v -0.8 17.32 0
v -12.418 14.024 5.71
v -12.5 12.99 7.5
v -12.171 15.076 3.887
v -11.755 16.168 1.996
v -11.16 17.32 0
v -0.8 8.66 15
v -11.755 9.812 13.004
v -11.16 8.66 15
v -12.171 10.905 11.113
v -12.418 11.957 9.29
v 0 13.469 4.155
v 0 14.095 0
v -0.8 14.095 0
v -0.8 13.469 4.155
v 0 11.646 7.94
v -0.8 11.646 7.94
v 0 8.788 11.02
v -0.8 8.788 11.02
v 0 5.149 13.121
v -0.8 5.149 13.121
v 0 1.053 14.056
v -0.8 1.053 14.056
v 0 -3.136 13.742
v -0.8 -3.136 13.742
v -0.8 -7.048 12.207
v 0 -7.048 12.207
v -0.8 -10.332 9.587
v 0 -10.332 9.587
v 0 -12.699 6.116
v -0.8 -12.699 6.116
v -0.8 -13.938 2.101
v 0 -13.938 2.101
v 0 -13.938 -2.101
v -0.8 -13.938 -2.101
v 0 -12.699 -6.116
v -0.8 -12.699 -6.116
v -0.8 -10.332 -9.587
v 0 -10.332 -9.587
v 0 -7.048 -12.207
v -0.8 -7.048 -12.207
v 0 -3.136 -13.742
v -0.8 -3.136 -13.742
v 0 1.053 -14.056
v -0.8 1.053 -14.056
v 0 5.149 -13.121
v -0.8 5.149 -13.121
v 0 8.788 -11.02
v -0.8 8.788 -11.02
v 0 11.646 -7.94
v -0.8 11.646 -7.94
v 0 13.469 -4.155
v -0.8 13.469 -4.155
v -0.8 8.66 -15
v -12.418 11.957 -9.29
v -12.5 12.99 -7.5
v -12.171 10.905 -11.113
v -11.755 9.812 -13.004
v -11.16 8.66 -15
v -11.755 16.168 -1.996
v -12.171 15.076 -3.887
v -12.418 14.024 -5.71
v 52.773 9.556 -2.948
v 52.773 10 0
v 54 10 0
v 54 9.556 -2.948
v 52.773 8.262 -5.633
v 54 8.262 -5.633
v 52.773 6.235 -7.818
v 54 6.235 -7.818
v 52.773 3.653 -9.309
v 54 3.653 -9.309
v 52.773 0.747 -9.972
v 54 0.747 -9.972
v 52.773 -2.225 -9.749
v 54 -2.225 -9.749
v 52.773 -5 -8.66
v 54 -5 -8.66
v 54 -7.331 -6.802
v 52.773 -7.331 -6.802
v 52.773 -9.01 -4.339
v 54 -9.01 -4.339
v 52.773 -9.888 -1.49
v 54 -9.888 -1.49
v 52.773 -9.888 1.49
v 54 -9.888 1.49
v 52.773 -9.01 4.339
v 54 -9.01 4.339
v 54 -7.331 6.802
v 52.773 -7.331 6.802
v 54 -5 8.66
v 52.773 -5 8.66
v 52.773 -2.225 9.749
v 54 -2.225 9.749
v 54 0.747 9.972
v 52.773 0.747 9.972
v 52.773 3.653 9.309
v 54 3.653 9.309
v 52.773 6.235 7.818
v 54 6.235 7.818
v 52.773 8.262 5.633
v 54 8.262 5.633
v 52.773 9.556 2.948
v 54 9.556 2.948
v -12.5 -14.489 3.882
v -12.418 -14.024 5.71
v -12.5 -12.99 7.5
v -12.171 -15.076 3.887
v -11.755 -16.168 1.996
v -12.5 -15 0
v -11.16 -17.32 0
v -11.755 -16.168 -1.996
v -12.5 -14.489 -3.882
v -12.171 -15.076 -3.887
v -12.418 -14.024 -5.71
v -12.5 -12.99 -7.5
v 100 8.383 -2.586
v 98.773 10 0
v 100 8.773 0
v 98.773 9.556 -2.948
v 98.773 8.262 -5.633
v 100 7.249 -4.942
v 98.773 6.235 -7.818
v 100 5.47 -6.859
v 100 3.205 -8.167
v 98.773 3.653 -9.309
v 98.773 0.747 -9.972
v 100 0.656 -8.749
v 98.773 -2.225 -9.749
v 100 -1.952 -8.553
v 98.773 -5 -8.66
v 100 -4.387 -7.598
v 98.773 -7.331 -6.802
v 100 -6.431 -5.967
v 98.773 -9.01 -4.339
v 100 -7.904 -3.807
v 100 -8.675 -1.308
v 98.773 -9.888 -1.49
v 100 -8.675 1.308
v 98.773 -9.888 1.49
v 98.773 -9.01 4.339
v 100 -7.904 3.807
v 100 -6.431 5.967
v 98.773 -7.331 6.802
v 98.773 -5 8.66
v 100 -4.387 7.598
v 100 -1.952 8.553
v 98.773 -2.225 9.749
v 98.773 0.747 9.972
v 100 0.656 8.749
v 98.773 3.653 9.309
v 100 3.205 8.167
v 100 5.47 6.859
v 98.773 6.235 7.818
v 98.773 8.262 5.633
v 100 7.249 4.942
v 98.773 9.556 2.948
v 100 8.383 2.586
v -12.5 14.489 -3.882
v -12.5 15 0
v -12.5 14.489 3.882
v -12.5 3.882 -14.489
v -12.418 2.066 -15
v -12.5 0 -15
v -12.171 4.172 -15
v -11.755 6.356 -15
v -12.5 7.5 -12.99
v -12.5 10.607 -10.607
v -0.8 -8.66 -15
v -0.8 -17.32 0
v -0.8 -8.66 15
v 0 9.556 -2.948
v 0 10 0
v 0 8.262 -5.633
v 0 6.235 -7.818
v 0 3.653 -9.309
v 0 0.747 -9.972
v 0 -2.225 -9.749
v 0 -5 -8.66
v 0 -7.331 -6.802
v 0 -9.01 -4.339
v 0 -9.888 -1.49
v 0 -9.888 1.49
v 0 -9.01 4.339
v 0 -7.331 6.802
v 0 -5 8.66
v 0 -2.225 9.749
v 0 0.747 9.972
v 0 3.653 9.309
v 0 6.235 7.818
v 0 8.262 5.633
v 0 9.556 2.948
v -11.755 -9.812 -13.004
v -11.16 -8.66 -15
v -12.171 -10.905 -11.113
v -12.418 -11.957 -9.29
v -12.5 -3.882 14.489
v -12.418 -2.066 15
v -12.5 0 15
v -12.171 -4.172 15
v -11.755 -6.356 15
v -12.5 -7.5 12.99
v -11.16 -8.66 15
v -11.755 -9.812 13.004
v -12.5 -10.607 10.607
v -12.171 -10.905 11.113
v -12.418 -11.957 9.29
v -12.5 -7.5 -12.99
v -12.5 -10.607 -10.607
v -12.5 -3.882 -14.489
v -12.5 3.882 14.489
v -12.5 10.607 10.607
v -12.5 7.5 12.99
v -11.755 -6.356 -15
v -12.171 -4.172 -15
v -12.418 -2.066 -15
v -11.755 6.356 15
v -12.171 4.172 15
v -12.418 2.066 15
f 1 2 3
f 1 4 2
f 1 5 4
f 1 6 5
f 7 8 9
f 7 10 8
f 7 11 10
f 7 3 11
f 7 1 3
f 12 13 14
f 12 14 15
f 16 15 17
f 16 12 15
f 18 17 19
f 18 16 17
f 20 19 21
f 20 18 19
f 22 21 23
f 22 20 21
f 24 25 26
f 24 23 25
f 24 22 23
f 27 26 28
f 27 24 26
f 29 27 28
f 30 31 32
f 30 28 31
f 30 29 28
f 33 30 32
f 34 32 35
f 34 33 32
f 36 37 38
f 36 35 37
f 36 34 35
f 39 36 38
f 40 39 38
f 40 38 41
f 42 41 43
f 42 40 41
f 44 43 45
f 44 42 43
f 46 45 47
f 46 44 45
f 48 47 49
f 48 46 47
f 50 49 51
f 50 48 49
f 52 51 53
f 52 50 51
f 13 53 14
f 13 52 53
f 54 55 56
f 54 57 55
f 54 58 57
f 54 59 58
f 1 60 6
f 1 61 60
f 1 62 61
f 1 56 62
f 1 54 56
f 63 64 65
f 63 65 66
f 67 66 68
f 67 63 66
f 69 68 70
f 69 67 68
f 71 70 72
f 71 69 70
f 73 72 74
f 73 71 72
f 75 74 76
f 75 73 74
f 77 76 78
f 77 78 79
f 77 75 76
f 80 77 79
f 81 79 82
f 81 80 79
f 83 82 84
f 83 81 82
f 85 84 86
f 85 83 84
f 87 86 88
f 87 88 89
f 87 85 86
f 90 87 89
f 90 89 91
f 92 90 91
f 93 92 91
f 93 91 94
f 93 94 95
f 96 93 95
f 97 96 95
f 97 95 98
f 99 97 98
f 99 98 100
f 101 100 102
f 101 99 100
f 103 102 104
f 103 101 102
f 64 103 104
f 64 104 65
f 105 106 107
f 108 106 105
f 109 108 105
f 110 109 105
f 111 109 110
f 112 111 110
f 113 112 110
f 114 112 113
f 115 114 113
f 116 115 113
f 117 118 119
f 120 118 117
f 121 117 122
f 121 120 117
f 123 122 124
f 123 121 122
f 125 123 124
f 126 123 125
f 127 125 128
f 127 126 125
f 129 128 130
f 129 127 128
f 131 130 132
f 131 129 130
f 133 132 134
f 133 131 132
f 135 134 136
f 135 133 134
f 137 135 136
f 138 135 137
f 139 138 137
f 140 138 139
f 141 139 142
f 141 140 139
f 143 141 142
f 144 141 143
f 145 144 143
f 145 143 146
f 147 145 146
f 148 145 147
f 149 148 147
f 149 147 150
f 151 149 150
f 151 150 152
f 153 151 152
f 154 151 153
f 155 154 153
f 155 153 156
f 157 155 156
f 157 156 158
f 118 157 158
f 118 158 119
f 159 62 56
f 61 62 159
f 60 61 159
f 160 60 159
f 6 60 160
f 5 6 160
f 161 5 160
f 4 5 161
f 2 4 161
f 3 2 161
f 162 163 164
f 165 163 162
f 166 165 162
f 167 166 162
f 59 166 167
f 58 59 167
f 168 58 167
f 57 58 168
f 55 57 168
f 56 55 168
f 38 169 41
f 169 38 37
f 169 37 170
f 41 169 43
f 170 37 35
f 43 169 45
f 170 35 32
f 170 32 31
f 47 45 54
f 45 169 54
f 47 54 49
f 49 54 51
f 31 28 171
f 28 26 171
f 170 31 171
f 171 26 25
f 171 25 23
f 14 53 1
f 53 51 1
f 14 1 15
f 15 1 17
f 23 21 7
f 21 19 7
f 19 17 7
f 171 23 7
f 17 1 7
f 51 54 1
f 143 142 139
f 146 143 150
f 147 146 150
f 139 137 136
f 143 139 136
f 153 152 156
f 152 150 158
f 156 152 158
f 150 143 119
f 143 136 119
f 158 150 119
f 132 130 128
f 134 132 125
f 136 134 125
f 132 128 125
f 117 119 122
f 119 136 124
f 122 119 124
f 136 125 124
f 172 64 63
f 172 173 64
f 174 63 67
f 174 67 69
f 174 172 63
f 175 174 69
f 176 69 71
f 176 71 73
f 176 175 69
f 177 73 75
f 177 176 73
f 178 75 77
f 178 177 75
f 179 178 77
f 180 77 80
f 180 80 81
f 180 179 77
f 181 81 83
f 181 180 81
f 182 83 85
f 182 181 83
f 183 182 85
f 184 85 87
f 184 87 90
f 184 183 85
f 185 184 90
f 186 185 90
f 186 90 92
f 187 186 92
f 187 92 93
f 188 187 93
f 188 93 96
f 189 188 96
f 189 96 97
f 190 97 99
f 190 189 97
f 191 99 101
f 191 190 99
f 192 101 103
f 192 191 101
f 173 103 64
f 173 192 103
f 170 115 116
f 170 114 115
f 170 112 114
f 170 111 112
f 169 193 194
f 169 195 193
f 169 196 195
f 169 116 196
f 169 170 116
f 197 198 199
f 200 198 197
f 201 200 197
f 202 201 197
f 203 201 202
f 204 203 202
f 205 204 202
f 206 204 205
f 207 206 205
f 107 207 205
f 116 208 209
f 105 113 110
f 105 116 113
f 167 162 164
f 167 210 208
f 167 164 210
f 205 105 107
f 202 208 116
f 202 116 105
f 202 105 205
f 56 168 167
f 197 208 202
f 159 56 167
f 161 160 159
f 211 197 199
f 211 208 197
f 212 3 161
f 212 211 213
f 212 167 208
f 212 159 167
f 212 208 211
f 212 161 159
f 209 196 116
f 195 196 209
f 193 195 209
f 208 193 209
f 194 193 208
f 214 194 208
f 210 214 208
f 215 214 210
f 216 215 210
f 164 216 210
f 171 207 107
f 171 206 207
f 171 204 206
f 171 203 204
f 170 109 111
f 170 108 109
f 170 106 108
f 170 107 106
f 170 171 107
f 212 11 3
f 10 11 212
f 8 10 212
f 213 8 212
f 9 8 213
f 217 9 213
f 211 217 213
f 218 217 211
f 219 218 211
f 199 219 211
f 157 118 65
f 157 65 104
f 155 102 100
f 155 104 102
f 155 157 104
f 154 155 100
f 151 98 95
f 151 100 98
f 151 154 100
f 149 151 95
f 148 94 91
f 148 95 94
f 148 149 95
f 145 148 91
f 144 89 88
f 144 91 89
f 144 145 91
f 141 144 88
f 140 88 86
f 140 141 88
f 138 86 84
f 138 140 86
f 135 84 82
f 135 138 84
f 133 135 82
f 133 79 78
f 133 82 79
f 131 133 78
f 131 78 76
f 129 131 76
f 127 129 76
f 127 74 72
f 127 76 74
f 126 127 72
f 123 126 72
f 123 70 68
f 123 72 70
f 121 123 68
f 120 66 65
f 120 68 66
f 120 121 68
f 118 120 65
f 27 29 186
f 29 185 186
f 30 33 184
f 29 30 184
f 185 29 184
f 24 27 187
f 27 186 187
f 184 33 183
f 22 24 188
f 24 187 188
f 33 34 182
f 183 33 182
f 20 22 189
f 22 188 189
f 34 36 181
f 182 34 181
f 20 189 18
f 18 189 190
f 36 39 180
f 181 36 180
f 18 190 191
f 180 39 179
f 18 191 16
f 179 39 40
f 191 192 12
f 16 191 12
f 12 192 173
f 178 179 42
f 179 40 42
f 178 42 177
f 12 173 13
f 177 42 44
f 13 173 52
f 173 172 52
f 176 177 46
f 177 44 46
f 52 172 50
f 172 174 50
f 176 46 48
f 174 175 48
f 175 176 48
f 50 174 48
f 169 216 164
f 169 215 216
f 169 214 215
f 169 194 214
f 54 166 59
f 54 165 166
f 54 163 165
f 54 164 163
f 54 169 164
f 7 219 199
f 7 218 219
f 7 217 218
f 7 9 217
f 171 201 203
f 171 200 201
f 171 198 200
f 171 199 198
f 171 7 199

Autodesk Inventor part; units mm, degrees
ref_plane "YZ Plane" through (0, 0, 0) normal (1, 0, 0) x (0, 1, 0)
ref_plane "XZ Plane" through (0, 0, 0) normal (0, 1, 0) x (-1, 0, 0)
sketch "Sketch1" plane through (0, 0, 0) normal (0, 0, 1) x (1, 0, 0)
  line L0 (0, 14.095) -> (0, 10)
  line L1 (54, 10) -> (100, 10)
  line L2 (100, 10) -> (100, 0)
  line L3 (100, 0) -> (-0.8001, 0)
  line L4 (-20.9601, 0) -> (120.16, 0) projected
  line L5 (-0.8001, 0) -> (-0.8001, 14.095)
  line L6 (-0.8001, 14.095) -> (0, 14.095)
  line L7 (54, 10) -> (52.773, 10)
  line L8 (52.773, 10) -> (0, 10)
  line L9 (0, -2.819) -> (0, 16.914) projected
  dimension "d0" = 100
  dimension "d1" = 46
  dimension "d2" = 20
  dimension "d9" = 0.8001
  dimension "d10" = 28.19
  dimension "d13" = 1.227
  dimension "d14" = 20
revolve "Body" add sketch "Sketch1" angle 360 about axis through (100, 0, 0) along (-1, 0, 0)
sketch "Sketch2" plane through (-0.8001, 0, 0) normal (-1, 0, 0) x (0, 0, 1)
  line L0 (0, 17.3205) -> (15, 8.6603)
  line L1 (15, 8.6603) -> (15, -8.6603)
  line L2 (15, -8.6603) -> (0, -17.3205)
  line L3 (0, -17.3205) -> (-15, -8.6603)
  line L4 (-15, -8.6603) -> (-15, 8.6603)
  line L5 (-15, 8.6603) -> (0, 17.3205)
  point P0 (0, 0)
  point P1 (0, 0)
  dimension "d11" = 30
extrude "Head" add sketch "Sketch2" along normal blind 11.7
sketch "Sketch4" plane through (0, 0, 0) normal (0, 0, 1) x (1, 0, 0)
  line L0 (-12.5001, 15) -> (-12.5001, 17.3205)
  line L1 (-12.5001, 17.3205) -> (-11.1604, 17.3205)
  line L2 (-11.1604, 17.3205) -> (-12.5001, 15)
  line L3 (-14.8401, 0) -> (1.5399, 0) projected
  line L4 (-0.8001, 17.3205) -> (-12.5001, 17.3205) projected
  line L5 (-12.5001, 8.6603) -> (-12.5001, 17.3205) projected
  dimension "d5" = 30
  dimension "d19" = 30
revolve "Chamfer1" cut sketch "Sketch4" angle 360 about axis through (-10, 0, 0) along (1, 0, 0)
thread "Thread" size "M20x2" class "6g" standard "ISO Metric profile" length 46
chamfer "Chamfer2" distance 1.2269 distance2 1.227 1 edges at (100, -10, 0) measured on face at (100, 2.4562, 0.99)
ref_plane "Work Plane1" through (1.525, 0, 0) normal (0, 0, 1) x (1, 0, 0)
equation "\"d0\" = NLG"
equation "\"d1\" = GEL"
equation "\"d2\" = GD"
equation "\"d10\" = SD2"
equation "\"d14\" = BDM"
equation "\"d11\" = SW"
equation "\"d3\" = KOH - SD"
equation "\"d5\" = ANG1"
equation "\"d19\" = SW0"
equation "\"d15\" = GEL"
equation "\"d6\" = -0.5 * SPD + 0.5 * GD"
equation "\"NLG\" = 100"
equation "\"GD\" = NND"
equation "\"BDM\" = NND"
equation "\"KOH\" = 12.5"
equation "\"GEL\" = 46"
equation "\"SW\" = 30"
equation "\"SW0\" = SW"
equation "\"SPD\" = NND - 1.2269 * PTC"
equation "\"SD2\" = 28.19"
equation "\"SD\" = 0.8"
equation "\"ANG1\" = 30deg"
equation "\"GAL\" = 0.61345 * PTC"
equation "\"GUL\" = 0.61345 * PTC"
equation "\"RR\" = 0.8"
equation "\"GD1\" = THREADDIA - 1.2269 * PTC"
equation "\"SDH\" = SD2"
equation "\"TOA\" = 30deg"
equation "\"PTC\" = 2"
equation "\"E0\" = 1.155 * SW"
equation "\"NND\" = 20"
equation "\"THREADDIA\" = 20"
properties part number "ISO 8765 - M20 x 2 x 100" material "Stainless Steel, 440C"
